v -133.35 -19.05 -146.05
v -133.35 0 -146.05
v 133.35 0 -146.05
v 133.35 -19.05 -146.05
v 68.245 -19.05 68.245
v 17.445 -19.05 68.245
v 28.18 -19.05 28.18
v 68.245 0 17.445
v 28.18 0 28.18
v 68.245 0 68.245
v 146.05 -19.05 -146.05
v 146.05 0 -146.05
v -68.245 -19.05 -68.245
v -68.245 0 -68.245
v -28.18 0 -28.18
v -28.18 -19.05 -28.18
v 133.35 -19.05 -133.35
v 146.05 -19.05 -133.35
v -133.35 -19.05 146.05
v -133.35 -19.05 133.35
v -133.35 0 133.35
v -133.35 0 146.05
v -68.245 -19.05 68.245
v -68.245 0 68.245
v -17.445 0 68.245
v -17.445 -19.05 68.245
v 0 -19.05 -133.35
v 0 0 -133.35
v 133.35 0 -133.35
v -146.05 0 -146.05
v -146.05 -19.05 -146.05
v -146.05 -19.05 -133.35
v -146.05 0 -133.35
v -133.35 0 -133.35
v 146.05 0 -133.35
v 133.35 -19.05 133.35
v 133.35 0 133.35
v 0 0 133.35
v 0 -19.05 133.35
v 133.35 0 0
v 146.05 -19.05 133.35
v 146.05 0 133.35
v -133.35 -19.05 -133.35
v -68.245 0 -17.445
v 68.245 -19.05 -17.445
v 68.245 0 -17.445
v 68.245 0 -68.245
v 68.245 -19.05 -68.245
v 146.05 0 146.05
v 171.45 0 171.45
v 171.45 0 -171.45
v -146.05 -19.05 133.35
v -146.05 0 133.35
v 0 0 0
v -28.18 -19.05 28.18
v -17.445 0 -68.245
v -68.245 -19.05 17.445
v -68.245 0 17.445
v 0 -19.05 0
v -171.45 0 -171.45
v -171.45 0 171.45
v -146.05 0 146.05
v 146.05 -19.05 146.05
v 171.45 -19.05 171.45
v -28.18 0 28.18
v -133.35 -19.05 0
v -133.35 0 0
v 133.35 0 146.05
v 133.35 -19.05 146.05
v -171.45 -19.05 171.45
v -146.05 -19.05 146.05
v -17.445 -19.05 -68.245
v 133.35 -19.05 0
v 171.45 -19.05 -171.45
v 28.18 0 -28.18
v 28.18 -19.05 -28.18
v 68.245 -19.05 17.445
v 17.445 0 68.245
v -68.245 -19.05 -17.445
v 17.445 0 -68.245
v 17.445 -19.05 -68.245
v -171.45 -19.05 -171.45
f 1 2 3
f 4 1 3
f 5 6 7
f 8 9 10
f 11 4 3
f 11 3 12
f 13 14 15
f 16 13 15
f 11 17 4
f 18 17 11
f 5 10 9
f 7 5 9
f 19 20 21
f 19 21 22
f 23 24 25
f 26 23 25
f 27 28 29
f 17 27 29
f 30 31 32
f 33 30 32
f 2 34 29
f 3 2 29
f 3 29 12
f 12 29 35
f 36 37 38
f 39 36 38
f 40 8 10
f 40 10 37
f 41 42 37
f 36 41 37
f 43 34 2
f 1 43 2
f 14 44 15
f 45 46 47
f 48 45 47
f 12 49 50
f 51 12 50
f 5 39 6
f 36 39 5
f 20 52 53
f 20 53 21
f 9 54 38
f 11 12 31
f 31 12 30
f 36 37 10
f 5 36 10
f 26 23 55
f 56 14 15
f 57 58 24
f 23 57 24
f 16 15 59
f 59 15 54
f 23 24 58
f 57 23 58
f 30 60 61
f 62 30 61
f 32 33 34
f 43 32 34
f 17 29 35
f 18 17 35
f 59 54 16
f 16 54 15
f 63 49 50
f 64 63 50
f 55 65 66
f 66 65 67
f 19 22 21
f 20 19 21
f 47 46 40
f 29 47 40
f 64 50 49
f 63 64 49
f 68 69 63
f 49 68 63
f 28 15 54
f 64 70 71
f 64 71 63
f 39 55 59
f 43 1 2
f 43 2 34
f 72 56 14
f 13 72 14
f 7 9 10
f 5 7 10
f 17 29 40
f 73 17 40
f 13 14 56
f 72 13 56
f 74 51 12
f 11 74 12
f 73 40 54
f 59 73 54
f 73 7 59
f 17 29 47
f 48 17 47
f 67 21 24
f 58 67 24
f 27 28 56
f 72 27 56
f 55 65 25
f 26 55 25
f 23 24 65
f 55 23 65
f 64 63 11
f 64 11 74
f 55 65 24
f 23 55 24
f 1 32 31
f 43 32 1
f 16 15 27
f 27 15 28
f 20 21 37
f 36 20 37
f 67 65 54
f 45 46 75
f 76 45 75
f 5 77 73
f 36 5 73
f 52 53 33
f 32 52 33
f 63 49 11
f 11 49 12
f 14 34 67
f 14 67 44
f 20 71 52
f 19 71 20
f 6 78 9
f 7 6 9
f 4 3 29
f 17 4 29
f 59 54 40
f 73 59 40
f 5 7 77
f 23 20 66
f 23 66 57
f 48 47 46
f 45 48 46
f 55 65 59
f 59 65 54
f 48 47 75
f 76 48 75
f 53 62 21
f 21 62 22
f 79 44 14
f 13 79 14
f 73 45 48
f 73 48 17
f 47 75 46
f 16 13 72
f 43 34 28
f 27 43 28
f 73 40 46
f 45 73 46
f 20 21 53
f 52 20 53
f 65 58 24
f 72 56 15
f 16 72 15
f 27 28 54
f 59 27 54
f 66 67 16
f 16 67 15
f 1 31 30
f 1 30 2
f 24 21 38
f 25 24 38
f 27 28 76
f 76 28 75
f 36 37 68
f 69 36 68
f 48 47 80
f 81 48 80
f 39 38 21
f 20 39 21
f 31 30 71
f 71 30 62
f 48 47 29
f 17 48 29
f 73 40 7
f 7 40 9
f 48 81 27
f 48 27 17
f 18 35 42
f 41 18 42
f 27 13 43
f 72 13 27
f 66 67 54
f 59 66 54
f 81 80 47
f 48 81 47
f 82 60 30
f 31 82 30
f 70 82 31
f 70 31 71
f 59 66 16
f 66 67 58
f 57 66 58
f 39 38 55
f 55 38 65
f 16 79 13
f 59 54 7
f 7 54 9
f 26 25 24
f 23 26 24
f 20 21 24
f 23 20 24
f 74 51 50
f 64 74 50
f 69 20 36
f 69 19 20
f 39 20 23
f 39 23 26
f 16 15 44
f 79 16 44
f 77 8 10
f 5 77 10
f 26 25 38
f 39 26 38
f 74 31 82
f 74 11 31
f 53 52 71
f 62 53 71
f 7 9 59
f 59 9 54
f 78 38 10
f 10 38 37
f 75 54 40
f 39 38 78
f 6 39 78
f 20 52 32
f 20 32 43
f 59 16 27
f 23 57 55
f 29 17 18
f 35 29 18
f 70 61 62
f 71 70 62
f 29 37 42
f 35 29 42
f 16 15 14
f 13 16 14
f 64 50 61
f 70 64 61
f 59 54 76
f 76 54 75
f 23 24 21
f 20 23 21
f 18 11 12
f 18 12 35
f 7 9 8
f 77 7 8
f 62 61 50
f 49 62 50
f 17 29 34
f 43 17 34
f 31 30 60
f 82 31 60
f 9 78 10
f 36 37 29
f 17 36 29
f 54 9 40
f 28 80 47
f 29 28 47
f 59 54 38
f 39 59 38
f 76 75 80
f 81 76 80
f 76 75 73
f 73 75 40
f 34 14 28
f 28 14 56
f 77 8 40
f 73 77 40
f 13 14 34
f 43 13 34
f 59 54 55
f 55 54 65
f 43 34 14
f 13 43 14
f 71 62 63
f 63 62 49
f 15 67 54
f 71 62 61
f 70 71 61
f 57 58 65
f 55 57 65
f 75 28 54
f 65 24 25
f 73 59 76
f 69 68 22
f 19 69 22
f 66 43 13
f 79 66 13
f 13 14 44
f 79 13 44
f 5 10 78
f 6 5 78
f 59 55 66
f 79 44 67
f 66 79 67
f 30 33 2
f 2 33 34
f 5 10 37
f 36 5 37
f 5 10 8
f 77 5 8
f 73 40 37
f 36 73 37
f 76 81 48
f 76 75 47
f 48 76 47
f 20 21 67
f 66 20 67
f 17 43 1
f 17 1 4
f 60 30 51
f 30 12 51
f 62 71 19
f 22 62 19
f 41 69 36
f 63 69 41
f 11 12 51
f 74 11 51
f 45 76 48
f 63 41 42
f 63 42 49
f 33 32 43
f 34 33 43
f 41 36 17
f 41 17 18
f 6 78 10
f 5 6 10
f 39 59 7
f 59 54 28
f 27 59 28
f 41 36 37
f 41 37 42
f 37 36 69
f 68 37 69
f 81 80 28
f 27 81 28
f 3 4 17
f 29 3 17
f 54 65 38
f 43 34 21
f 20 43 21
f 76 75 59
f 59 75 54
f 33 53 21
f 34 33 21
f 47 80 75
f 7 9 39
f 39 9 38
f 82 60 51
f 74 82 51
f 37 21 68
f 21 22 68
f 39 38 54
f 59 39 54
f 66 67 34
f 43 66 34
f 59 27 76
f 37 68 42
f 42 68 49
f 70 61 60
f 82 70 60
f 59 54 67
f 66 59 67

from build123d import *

# Parameters (mm, degrees)
F1_DEPTH  = 19.05
F2_DEPTH  = 19.05
F3_DEPTH  = 19.05
F4_DEPTH  = 19.05
F5_DEPTH  = 19.05
F6_DEPTH  = 19.05
F0_W      = 12.7
F0_H      = 12.7
F7_DEPTH  = 19.05
F8_DEPTH  = 19.05
F10_DEPTH = 19.05
F11_DEPTH = 19.05
F12_DEPTH = 19.05
F13_DEPTH = 19.05


with BuildPart() as f1:
    # F0 (on Front) → F1 (new body)
    with BuildSketch(Plane.XZ):
        Polygon((146.05, 146.05), (146.05, 133.35), (146.05, -133.35), (146.05, -146.05), (171.45, -171.45), (171.45, 171.45), align=None)
    extrude(amount=F1_DEPTH)


with BuildPart() as f1b:
    # F0 (on Front) → F1, piece 2 (new body)
    with BuildSketch(Plane.XZ):
        Polygon((-146.05, -133.35), (-146.05, 133.35), (-146.05, 146.05), (-171.45, 171.45), (-171.45, -171.45), (-146.05, -146.05), align=None)
    extrude(amount=F1_DEPTH)


with BuildPart() as f2:
    # F0 (on Front) → F2 (new body)
    with BuildSketch(Plane.XZ):
        Polygon((-146.05, 146.05), (-133.35, 146.05), (133.35, 146.05), (146.05, 146.05), (171.45, 171.45), (-171.45, 171.45), align=None)
    extrude(amount=F2_DEPTH)


with BuildPart() as f2b:
    # F0 (on Front) → F2, piece 2 (new body)
    with BuildSketch(Plane.XZ):
        Polygon((133.35, -146.05), (-133.35, -146.05), (-146.05, -146.05), (-171.45, -171.45), (171.45, -171.45), (146.05, -146.05), align=None)
    extrude(amount=F2_DEPTH)


with BuildPart() as f3:
    # F0 (on Front) → F3 (new body)
    with BuildSketch(Plane.XZ):
        Polygon((0, 0), (0, 133.35), (-17.4448676392, 68.2448676392), (-28.1801708018, 28.1801708018), align=None)
    extrude(amount=F3_DEPTH)


with BuildPart() as f3b:
    # F0 (on Front) → F3, piece 2 (new body)
    with BuildSketch(Plane.XZ):
        Polygon((28.1801708018, 28.1801708018), (0, 0), (133.35, 0), (68.2448676392, 17.4448676392), align=None)
    extrude(amount=F3_DEPTH)


with BuildPart() as f3c:
    # F0 (on Front) → F3, piece 3 (new body)
    with BuildSketch(Plane.XZ):
        Polygon((28.1801708018, -28.1801708018), (0, 0), (0, -133.35), (17.4448676392, -68.2448676392), align=None)
    extrude(amount=F3_DEPTH)


with BuildPart() as f3d:
    # F0 (on Front) → F3, piece 4 (new body)
    with BuildSketch(Plane.XZ):
        Polygon((-28.1801708018, -28.1801708018), (0, 0), (-133.35, 0), (-68.2448676392, -17.4448676392), align=None)
    extrude(amount=F3_DEPTH)


with BuildPart() as f4:
    # F0 (on Front) → F4 (new body)
    with BuildSketch(Plane.XZ):
        Polygon((68.2448676392, 68.2448676392), (17.4448676392, 68.2448676392), (28.1801708018, 28.1801708018), align=None)
    extrude(amount=F4_DEPTH)


with BuildPart() as f4b:
    # F0 (on Front) → F4, piece 2 (new body)
    with BuildSketch(Plane.XZ):
        Polygon((68.2448676392, -17.4448676392), (28.1801708018, -28.1801708018), (68.2448676392, -68.2448676392), align=None)
    extrude(amount=F4_DEPTH)


with BuildPart() as f4c:
    # F0 (on Front) → F4, piece 3 (new body)
    with BuildSketch(Plane.XZ):
        Polygon((-17.4448676392, -68.2448676392), (-28.1801708018, -28.1801708018), (-68.2448676392, -68.2448676392), align=None)
    extrude(amount=F4_DEPTH)


with BuildPart() as f4d:
    # F0 (on Front) → F4, piece 4 (new body)
    with BuildSketch(Plane.XZ):
        Polygon((-68.2448676392, 17.4448676392), (-28.1801708018, 28.1801708018), (-68.2448676392, 68.2448676392), align=None)
    extrude(amount=F4_DEPTH)


with BuildPart() as f5:
    # F0 (on Front) → F5 (new body)
    with BuildSketch(Plane.XZ):
        Polygon((-28.1801708018, 28.1801708018), (-17.4448676392, 68.2448676392), (-68.2448676392, 68.2448676392), align=None)
    extrude(amount=F5_DEPTH)


with BuildPart() as f5b:
    # F0 (on Front) → F5, piece 2 (new body)
    with BuildSketch(Plane.XZ):
        Polygon((68.2448676392, 68.2448676392), (28.1801708018, 28.1801708018), (68.2448676392, 17.4448676392), align=None)
    extrude(amount=F5_DEPTH)


with BuildPart() as f5c:
    # F0 (on Front) → F5, piece 3 (new body)
    with BuildSketch(Plane.XZ):
        Polygon((68.2448676392, -68.2448676392), (28.1801708018, -28.1801708018), (17.4448676392, -68.2448676392), align=None)
    extrude(amount=F5_DEPTH)


with BuildPart() as f5d:
    # F0 (on Front) → F5, piece 4 (new body)
    with BuildSketch(Plane.XZ):
        Polygon((-68.2448676392, -68.2448676392), (-28.1801708018, -28.1801708018), (-68.2448676392, -17.4448676392), align=None)
    extrude(amount=F5_DEPTH)


with BuildPart() as f6:
    # F0 (on Front) → F6 (new body)
    with BuildSketch(Plane.XZ):
        Polygon((17.4448676392, 68.2448676392), (0, 133.35), (0, 0), (28.1801708018, 28.1801708018), align=None)
    extrude(amount=F6_DEPTH)


with BuildPart() as f6b:
    # F0 (on Front) → F6, piece 2 (new body)
    with BuildSketch(Plane.XZ):
        Polygon((133.35, 0), (0, 0), (28.1801708018, -28.1801708018), (68.2448676392, -17.4448676392), align=None)
    extrude(amount=F6_DEPTH)


with BuildPart() as f6c:
    # F0 (on Front) → F6, piece 3 (new body)
    with BuildSketch(Plane.XZ):
        Polygon((0, -133.35), (0, 0), (-28.1801708018, -28.1801708018), (-17.4448676392, -68.2448676392), align=None)
    extrude(amount=F6_DEPTH)


with BuildPart() as f6d:
    # F0 (on Front) → F6, piece 4 (new body)
    with BuildSketch(Plane.XZ):
        Polygon((-133.35, 0), (0, 0), (-28.1801708018, 28.1801708018), (-68.2448676392, 17.4448676392), align=None)
    extrude(amount=F6_DEPTH)


with BuildPart() as f7:
    # F0 (on Front) → F7 (new body)
    with BuildSketch(Plane.XZ):
        with Locations((-139.7, 139.7)):
            Rectangle(F0_W, F0_H)
    extrude(amount=F7_DEPTH)


with BuildPart() as f7b:
    # F0 (on Front) → F7, piece 2 (new body)
    with BuildSketch(Plane.XZ):
        with Locations((139.7, 139.7)):
            Rectangle(F0_W, F0_H)
    extrude(amount=F7_DEPTH)


with BuildPart() as f7c:
    # F0 (on Front) → F7, piece 3 (new body)
    with BuildSketch(Plane.XZ):
        with Locations((139.7, -139.7)):
            Rectangle(F0_W, F0_H)
    extrude(amount=F7_DEPTH)


with BuildPart() as f7d:
    # F0 (on Front) → F7, piece 4 (new body)
    with BuildSketch(Plane.XZ):
        with Locations((-139.7, -139.7)):
            Rectangle(F0_W, F0_H)
    extrude(amount=F7_DEPTH)


with BuildPart() as f8:
    # F0 (on Front) → F8 (new body)
    with BuildSketch(Plane.XZ):
        Polygon((-133.35, 133.35), (0, 133.35), (133.35, 133.35), (133.35, 146.05), (-133.35, 146.05), align=None)
    extrude(amount=F8_DEPTH)


with BuildPart() as f8b:
    # F0 (on Front) → F8, piece 2 (new body)
    with BuildSketch(Plane.XZ):
        Polygon((146.05, 133.35), (133.35, 133.35), (133.35, 0), (133.35, -133.35), (146.05, -133.35), align=None)
    extrude(amount=F8_DEPTH)


with BuildPart() as f8c:
    # F0 (on Front) → F8, piece 3 (new body)
    with BuildSketch(Plane.XZ):
        Polygon((133.35, -133.35), (0, -133.35), (-133.35, -133.35), (-133.35, -146.05), (133.35, -146.05), align=None)
    extrude(amount=F8_DEPTH)


with BuildPart() as f8d:
    # F0 (on Front) → F8, piece 4 (new body)
    with BuildSketch(Plane.XZ):
        Polygon((-133.35, 0), (-133.35, 133.35), (-146.05, 133.35), (-146.05, -133.35), (-133.35, -133.35), align=None)
    extrude(amount=F8_DEPTH)


with BuildPart() as f10:
    # F9 (on Front) → F10 (new body)
    with BuildSketch(Plane.XZ):
        Polygon((0, 133.35), (-133.35, 133.35), (-68.2448676392, 68.2448676392), (-17.4448676392, 68.2448676392), align=None)
    extrude(amount=F10_DEPTH)


with BuildPart() as f10b:
    # F9 (on Front) → F10, piece 2 (new body)
    with BuildSketch(Plane.XZ):
        Polygon((133.35, 133.35), (0, 133.35), (17.4448676392, 68.2448676392), (68.2448676392, 68.2448676392), align=None)
    extrude(amount=F10_DEPTH)


with BuildPart() as f11:
    # F9 (on Front) → F11 (new body)
    with BuildSketch(Plane.XZ):
        Polygon((-68.2448676392, 68.2448676392), (-133.35, 133.35), (-133.35, 0), (-68.2448676392, 17.4448676392), align=None)
    extrude(amount=F11_DEPTH)


with BuildPart() as f11b:
    # F9 (on Front) → F11, piece 2 (new body)
    with BuildSketch(Plane.XZ):
        Polygon((-68.2448676392, -17.4448676392), (-133.35, 0), (-133.35, -133.35), (-68.2448676392, -68.2448676392), align=None)
    extrude(amount=F11_DEPTH)


with BuildPart() as f12:
    # F9 (on Front) → F12 (new body)
    with BuildSketch(Plane.XZ):
        Polygon((133.35, 0), (133.35, 133.35), (68.2448676392, 68.2448676392), (68.2448676392, 17.4448676392), align=None)
    extrude(amount=F12_DEPTH)


with BuildPart() as f12b:
    # F9 (on Front) → F12, piece 2 (new body)
    with BuildSketch(Plane.XZ):
        Polygon((133.35, -133.35), (133.35, 0), (68.2448676392, -17.4448676392), (68.2448676392, -68.2448676392), align=None)
    extrude(amount=F12_DEPTH)


with BuildPart() as f13:
    # F9 (on Front) → F13 (new body)
    with BuildSketch(Plane.XZ):
        Polygon((-68.2448676392, -68.2448676392), (-133.35, -133.35), (0, -133.35), (-17.4448676392, -68.2448676392), align=None)
    extrude(amount=F13_DEPTH)


with BuildPart() as f13b:
    # F9 (on Front) → F13, piece 2 (new body)
    with BuildSketch(Plane.XZ):
        Polygon((17.4448676392, -68.2448676392), (0, -133.35), (133.35, -133.35), (68.2448676392, -68.2448676392), align=None)
    extrude(amount=F13_DEPTH)


solid = Compound([f1.part, f1b.part, f2.part, f2b.part, f3.part, f3b.part, f3c.part, f3d.part, f4.part, f4b.part, f4c.part, f4d.part, f5.part, f5b.part, f5c.part, f5d.part, f6.part, f6b.part, f6c.part, f6d.part, f7.part, f7b.part, f7c.part, f7d.part, f8.part, f8b.part, f8c.part, f8d.part, f10.part, f10b.part, f11.part, f11b.part, f12.part, f12b.part, f13.part, f13b.part])
